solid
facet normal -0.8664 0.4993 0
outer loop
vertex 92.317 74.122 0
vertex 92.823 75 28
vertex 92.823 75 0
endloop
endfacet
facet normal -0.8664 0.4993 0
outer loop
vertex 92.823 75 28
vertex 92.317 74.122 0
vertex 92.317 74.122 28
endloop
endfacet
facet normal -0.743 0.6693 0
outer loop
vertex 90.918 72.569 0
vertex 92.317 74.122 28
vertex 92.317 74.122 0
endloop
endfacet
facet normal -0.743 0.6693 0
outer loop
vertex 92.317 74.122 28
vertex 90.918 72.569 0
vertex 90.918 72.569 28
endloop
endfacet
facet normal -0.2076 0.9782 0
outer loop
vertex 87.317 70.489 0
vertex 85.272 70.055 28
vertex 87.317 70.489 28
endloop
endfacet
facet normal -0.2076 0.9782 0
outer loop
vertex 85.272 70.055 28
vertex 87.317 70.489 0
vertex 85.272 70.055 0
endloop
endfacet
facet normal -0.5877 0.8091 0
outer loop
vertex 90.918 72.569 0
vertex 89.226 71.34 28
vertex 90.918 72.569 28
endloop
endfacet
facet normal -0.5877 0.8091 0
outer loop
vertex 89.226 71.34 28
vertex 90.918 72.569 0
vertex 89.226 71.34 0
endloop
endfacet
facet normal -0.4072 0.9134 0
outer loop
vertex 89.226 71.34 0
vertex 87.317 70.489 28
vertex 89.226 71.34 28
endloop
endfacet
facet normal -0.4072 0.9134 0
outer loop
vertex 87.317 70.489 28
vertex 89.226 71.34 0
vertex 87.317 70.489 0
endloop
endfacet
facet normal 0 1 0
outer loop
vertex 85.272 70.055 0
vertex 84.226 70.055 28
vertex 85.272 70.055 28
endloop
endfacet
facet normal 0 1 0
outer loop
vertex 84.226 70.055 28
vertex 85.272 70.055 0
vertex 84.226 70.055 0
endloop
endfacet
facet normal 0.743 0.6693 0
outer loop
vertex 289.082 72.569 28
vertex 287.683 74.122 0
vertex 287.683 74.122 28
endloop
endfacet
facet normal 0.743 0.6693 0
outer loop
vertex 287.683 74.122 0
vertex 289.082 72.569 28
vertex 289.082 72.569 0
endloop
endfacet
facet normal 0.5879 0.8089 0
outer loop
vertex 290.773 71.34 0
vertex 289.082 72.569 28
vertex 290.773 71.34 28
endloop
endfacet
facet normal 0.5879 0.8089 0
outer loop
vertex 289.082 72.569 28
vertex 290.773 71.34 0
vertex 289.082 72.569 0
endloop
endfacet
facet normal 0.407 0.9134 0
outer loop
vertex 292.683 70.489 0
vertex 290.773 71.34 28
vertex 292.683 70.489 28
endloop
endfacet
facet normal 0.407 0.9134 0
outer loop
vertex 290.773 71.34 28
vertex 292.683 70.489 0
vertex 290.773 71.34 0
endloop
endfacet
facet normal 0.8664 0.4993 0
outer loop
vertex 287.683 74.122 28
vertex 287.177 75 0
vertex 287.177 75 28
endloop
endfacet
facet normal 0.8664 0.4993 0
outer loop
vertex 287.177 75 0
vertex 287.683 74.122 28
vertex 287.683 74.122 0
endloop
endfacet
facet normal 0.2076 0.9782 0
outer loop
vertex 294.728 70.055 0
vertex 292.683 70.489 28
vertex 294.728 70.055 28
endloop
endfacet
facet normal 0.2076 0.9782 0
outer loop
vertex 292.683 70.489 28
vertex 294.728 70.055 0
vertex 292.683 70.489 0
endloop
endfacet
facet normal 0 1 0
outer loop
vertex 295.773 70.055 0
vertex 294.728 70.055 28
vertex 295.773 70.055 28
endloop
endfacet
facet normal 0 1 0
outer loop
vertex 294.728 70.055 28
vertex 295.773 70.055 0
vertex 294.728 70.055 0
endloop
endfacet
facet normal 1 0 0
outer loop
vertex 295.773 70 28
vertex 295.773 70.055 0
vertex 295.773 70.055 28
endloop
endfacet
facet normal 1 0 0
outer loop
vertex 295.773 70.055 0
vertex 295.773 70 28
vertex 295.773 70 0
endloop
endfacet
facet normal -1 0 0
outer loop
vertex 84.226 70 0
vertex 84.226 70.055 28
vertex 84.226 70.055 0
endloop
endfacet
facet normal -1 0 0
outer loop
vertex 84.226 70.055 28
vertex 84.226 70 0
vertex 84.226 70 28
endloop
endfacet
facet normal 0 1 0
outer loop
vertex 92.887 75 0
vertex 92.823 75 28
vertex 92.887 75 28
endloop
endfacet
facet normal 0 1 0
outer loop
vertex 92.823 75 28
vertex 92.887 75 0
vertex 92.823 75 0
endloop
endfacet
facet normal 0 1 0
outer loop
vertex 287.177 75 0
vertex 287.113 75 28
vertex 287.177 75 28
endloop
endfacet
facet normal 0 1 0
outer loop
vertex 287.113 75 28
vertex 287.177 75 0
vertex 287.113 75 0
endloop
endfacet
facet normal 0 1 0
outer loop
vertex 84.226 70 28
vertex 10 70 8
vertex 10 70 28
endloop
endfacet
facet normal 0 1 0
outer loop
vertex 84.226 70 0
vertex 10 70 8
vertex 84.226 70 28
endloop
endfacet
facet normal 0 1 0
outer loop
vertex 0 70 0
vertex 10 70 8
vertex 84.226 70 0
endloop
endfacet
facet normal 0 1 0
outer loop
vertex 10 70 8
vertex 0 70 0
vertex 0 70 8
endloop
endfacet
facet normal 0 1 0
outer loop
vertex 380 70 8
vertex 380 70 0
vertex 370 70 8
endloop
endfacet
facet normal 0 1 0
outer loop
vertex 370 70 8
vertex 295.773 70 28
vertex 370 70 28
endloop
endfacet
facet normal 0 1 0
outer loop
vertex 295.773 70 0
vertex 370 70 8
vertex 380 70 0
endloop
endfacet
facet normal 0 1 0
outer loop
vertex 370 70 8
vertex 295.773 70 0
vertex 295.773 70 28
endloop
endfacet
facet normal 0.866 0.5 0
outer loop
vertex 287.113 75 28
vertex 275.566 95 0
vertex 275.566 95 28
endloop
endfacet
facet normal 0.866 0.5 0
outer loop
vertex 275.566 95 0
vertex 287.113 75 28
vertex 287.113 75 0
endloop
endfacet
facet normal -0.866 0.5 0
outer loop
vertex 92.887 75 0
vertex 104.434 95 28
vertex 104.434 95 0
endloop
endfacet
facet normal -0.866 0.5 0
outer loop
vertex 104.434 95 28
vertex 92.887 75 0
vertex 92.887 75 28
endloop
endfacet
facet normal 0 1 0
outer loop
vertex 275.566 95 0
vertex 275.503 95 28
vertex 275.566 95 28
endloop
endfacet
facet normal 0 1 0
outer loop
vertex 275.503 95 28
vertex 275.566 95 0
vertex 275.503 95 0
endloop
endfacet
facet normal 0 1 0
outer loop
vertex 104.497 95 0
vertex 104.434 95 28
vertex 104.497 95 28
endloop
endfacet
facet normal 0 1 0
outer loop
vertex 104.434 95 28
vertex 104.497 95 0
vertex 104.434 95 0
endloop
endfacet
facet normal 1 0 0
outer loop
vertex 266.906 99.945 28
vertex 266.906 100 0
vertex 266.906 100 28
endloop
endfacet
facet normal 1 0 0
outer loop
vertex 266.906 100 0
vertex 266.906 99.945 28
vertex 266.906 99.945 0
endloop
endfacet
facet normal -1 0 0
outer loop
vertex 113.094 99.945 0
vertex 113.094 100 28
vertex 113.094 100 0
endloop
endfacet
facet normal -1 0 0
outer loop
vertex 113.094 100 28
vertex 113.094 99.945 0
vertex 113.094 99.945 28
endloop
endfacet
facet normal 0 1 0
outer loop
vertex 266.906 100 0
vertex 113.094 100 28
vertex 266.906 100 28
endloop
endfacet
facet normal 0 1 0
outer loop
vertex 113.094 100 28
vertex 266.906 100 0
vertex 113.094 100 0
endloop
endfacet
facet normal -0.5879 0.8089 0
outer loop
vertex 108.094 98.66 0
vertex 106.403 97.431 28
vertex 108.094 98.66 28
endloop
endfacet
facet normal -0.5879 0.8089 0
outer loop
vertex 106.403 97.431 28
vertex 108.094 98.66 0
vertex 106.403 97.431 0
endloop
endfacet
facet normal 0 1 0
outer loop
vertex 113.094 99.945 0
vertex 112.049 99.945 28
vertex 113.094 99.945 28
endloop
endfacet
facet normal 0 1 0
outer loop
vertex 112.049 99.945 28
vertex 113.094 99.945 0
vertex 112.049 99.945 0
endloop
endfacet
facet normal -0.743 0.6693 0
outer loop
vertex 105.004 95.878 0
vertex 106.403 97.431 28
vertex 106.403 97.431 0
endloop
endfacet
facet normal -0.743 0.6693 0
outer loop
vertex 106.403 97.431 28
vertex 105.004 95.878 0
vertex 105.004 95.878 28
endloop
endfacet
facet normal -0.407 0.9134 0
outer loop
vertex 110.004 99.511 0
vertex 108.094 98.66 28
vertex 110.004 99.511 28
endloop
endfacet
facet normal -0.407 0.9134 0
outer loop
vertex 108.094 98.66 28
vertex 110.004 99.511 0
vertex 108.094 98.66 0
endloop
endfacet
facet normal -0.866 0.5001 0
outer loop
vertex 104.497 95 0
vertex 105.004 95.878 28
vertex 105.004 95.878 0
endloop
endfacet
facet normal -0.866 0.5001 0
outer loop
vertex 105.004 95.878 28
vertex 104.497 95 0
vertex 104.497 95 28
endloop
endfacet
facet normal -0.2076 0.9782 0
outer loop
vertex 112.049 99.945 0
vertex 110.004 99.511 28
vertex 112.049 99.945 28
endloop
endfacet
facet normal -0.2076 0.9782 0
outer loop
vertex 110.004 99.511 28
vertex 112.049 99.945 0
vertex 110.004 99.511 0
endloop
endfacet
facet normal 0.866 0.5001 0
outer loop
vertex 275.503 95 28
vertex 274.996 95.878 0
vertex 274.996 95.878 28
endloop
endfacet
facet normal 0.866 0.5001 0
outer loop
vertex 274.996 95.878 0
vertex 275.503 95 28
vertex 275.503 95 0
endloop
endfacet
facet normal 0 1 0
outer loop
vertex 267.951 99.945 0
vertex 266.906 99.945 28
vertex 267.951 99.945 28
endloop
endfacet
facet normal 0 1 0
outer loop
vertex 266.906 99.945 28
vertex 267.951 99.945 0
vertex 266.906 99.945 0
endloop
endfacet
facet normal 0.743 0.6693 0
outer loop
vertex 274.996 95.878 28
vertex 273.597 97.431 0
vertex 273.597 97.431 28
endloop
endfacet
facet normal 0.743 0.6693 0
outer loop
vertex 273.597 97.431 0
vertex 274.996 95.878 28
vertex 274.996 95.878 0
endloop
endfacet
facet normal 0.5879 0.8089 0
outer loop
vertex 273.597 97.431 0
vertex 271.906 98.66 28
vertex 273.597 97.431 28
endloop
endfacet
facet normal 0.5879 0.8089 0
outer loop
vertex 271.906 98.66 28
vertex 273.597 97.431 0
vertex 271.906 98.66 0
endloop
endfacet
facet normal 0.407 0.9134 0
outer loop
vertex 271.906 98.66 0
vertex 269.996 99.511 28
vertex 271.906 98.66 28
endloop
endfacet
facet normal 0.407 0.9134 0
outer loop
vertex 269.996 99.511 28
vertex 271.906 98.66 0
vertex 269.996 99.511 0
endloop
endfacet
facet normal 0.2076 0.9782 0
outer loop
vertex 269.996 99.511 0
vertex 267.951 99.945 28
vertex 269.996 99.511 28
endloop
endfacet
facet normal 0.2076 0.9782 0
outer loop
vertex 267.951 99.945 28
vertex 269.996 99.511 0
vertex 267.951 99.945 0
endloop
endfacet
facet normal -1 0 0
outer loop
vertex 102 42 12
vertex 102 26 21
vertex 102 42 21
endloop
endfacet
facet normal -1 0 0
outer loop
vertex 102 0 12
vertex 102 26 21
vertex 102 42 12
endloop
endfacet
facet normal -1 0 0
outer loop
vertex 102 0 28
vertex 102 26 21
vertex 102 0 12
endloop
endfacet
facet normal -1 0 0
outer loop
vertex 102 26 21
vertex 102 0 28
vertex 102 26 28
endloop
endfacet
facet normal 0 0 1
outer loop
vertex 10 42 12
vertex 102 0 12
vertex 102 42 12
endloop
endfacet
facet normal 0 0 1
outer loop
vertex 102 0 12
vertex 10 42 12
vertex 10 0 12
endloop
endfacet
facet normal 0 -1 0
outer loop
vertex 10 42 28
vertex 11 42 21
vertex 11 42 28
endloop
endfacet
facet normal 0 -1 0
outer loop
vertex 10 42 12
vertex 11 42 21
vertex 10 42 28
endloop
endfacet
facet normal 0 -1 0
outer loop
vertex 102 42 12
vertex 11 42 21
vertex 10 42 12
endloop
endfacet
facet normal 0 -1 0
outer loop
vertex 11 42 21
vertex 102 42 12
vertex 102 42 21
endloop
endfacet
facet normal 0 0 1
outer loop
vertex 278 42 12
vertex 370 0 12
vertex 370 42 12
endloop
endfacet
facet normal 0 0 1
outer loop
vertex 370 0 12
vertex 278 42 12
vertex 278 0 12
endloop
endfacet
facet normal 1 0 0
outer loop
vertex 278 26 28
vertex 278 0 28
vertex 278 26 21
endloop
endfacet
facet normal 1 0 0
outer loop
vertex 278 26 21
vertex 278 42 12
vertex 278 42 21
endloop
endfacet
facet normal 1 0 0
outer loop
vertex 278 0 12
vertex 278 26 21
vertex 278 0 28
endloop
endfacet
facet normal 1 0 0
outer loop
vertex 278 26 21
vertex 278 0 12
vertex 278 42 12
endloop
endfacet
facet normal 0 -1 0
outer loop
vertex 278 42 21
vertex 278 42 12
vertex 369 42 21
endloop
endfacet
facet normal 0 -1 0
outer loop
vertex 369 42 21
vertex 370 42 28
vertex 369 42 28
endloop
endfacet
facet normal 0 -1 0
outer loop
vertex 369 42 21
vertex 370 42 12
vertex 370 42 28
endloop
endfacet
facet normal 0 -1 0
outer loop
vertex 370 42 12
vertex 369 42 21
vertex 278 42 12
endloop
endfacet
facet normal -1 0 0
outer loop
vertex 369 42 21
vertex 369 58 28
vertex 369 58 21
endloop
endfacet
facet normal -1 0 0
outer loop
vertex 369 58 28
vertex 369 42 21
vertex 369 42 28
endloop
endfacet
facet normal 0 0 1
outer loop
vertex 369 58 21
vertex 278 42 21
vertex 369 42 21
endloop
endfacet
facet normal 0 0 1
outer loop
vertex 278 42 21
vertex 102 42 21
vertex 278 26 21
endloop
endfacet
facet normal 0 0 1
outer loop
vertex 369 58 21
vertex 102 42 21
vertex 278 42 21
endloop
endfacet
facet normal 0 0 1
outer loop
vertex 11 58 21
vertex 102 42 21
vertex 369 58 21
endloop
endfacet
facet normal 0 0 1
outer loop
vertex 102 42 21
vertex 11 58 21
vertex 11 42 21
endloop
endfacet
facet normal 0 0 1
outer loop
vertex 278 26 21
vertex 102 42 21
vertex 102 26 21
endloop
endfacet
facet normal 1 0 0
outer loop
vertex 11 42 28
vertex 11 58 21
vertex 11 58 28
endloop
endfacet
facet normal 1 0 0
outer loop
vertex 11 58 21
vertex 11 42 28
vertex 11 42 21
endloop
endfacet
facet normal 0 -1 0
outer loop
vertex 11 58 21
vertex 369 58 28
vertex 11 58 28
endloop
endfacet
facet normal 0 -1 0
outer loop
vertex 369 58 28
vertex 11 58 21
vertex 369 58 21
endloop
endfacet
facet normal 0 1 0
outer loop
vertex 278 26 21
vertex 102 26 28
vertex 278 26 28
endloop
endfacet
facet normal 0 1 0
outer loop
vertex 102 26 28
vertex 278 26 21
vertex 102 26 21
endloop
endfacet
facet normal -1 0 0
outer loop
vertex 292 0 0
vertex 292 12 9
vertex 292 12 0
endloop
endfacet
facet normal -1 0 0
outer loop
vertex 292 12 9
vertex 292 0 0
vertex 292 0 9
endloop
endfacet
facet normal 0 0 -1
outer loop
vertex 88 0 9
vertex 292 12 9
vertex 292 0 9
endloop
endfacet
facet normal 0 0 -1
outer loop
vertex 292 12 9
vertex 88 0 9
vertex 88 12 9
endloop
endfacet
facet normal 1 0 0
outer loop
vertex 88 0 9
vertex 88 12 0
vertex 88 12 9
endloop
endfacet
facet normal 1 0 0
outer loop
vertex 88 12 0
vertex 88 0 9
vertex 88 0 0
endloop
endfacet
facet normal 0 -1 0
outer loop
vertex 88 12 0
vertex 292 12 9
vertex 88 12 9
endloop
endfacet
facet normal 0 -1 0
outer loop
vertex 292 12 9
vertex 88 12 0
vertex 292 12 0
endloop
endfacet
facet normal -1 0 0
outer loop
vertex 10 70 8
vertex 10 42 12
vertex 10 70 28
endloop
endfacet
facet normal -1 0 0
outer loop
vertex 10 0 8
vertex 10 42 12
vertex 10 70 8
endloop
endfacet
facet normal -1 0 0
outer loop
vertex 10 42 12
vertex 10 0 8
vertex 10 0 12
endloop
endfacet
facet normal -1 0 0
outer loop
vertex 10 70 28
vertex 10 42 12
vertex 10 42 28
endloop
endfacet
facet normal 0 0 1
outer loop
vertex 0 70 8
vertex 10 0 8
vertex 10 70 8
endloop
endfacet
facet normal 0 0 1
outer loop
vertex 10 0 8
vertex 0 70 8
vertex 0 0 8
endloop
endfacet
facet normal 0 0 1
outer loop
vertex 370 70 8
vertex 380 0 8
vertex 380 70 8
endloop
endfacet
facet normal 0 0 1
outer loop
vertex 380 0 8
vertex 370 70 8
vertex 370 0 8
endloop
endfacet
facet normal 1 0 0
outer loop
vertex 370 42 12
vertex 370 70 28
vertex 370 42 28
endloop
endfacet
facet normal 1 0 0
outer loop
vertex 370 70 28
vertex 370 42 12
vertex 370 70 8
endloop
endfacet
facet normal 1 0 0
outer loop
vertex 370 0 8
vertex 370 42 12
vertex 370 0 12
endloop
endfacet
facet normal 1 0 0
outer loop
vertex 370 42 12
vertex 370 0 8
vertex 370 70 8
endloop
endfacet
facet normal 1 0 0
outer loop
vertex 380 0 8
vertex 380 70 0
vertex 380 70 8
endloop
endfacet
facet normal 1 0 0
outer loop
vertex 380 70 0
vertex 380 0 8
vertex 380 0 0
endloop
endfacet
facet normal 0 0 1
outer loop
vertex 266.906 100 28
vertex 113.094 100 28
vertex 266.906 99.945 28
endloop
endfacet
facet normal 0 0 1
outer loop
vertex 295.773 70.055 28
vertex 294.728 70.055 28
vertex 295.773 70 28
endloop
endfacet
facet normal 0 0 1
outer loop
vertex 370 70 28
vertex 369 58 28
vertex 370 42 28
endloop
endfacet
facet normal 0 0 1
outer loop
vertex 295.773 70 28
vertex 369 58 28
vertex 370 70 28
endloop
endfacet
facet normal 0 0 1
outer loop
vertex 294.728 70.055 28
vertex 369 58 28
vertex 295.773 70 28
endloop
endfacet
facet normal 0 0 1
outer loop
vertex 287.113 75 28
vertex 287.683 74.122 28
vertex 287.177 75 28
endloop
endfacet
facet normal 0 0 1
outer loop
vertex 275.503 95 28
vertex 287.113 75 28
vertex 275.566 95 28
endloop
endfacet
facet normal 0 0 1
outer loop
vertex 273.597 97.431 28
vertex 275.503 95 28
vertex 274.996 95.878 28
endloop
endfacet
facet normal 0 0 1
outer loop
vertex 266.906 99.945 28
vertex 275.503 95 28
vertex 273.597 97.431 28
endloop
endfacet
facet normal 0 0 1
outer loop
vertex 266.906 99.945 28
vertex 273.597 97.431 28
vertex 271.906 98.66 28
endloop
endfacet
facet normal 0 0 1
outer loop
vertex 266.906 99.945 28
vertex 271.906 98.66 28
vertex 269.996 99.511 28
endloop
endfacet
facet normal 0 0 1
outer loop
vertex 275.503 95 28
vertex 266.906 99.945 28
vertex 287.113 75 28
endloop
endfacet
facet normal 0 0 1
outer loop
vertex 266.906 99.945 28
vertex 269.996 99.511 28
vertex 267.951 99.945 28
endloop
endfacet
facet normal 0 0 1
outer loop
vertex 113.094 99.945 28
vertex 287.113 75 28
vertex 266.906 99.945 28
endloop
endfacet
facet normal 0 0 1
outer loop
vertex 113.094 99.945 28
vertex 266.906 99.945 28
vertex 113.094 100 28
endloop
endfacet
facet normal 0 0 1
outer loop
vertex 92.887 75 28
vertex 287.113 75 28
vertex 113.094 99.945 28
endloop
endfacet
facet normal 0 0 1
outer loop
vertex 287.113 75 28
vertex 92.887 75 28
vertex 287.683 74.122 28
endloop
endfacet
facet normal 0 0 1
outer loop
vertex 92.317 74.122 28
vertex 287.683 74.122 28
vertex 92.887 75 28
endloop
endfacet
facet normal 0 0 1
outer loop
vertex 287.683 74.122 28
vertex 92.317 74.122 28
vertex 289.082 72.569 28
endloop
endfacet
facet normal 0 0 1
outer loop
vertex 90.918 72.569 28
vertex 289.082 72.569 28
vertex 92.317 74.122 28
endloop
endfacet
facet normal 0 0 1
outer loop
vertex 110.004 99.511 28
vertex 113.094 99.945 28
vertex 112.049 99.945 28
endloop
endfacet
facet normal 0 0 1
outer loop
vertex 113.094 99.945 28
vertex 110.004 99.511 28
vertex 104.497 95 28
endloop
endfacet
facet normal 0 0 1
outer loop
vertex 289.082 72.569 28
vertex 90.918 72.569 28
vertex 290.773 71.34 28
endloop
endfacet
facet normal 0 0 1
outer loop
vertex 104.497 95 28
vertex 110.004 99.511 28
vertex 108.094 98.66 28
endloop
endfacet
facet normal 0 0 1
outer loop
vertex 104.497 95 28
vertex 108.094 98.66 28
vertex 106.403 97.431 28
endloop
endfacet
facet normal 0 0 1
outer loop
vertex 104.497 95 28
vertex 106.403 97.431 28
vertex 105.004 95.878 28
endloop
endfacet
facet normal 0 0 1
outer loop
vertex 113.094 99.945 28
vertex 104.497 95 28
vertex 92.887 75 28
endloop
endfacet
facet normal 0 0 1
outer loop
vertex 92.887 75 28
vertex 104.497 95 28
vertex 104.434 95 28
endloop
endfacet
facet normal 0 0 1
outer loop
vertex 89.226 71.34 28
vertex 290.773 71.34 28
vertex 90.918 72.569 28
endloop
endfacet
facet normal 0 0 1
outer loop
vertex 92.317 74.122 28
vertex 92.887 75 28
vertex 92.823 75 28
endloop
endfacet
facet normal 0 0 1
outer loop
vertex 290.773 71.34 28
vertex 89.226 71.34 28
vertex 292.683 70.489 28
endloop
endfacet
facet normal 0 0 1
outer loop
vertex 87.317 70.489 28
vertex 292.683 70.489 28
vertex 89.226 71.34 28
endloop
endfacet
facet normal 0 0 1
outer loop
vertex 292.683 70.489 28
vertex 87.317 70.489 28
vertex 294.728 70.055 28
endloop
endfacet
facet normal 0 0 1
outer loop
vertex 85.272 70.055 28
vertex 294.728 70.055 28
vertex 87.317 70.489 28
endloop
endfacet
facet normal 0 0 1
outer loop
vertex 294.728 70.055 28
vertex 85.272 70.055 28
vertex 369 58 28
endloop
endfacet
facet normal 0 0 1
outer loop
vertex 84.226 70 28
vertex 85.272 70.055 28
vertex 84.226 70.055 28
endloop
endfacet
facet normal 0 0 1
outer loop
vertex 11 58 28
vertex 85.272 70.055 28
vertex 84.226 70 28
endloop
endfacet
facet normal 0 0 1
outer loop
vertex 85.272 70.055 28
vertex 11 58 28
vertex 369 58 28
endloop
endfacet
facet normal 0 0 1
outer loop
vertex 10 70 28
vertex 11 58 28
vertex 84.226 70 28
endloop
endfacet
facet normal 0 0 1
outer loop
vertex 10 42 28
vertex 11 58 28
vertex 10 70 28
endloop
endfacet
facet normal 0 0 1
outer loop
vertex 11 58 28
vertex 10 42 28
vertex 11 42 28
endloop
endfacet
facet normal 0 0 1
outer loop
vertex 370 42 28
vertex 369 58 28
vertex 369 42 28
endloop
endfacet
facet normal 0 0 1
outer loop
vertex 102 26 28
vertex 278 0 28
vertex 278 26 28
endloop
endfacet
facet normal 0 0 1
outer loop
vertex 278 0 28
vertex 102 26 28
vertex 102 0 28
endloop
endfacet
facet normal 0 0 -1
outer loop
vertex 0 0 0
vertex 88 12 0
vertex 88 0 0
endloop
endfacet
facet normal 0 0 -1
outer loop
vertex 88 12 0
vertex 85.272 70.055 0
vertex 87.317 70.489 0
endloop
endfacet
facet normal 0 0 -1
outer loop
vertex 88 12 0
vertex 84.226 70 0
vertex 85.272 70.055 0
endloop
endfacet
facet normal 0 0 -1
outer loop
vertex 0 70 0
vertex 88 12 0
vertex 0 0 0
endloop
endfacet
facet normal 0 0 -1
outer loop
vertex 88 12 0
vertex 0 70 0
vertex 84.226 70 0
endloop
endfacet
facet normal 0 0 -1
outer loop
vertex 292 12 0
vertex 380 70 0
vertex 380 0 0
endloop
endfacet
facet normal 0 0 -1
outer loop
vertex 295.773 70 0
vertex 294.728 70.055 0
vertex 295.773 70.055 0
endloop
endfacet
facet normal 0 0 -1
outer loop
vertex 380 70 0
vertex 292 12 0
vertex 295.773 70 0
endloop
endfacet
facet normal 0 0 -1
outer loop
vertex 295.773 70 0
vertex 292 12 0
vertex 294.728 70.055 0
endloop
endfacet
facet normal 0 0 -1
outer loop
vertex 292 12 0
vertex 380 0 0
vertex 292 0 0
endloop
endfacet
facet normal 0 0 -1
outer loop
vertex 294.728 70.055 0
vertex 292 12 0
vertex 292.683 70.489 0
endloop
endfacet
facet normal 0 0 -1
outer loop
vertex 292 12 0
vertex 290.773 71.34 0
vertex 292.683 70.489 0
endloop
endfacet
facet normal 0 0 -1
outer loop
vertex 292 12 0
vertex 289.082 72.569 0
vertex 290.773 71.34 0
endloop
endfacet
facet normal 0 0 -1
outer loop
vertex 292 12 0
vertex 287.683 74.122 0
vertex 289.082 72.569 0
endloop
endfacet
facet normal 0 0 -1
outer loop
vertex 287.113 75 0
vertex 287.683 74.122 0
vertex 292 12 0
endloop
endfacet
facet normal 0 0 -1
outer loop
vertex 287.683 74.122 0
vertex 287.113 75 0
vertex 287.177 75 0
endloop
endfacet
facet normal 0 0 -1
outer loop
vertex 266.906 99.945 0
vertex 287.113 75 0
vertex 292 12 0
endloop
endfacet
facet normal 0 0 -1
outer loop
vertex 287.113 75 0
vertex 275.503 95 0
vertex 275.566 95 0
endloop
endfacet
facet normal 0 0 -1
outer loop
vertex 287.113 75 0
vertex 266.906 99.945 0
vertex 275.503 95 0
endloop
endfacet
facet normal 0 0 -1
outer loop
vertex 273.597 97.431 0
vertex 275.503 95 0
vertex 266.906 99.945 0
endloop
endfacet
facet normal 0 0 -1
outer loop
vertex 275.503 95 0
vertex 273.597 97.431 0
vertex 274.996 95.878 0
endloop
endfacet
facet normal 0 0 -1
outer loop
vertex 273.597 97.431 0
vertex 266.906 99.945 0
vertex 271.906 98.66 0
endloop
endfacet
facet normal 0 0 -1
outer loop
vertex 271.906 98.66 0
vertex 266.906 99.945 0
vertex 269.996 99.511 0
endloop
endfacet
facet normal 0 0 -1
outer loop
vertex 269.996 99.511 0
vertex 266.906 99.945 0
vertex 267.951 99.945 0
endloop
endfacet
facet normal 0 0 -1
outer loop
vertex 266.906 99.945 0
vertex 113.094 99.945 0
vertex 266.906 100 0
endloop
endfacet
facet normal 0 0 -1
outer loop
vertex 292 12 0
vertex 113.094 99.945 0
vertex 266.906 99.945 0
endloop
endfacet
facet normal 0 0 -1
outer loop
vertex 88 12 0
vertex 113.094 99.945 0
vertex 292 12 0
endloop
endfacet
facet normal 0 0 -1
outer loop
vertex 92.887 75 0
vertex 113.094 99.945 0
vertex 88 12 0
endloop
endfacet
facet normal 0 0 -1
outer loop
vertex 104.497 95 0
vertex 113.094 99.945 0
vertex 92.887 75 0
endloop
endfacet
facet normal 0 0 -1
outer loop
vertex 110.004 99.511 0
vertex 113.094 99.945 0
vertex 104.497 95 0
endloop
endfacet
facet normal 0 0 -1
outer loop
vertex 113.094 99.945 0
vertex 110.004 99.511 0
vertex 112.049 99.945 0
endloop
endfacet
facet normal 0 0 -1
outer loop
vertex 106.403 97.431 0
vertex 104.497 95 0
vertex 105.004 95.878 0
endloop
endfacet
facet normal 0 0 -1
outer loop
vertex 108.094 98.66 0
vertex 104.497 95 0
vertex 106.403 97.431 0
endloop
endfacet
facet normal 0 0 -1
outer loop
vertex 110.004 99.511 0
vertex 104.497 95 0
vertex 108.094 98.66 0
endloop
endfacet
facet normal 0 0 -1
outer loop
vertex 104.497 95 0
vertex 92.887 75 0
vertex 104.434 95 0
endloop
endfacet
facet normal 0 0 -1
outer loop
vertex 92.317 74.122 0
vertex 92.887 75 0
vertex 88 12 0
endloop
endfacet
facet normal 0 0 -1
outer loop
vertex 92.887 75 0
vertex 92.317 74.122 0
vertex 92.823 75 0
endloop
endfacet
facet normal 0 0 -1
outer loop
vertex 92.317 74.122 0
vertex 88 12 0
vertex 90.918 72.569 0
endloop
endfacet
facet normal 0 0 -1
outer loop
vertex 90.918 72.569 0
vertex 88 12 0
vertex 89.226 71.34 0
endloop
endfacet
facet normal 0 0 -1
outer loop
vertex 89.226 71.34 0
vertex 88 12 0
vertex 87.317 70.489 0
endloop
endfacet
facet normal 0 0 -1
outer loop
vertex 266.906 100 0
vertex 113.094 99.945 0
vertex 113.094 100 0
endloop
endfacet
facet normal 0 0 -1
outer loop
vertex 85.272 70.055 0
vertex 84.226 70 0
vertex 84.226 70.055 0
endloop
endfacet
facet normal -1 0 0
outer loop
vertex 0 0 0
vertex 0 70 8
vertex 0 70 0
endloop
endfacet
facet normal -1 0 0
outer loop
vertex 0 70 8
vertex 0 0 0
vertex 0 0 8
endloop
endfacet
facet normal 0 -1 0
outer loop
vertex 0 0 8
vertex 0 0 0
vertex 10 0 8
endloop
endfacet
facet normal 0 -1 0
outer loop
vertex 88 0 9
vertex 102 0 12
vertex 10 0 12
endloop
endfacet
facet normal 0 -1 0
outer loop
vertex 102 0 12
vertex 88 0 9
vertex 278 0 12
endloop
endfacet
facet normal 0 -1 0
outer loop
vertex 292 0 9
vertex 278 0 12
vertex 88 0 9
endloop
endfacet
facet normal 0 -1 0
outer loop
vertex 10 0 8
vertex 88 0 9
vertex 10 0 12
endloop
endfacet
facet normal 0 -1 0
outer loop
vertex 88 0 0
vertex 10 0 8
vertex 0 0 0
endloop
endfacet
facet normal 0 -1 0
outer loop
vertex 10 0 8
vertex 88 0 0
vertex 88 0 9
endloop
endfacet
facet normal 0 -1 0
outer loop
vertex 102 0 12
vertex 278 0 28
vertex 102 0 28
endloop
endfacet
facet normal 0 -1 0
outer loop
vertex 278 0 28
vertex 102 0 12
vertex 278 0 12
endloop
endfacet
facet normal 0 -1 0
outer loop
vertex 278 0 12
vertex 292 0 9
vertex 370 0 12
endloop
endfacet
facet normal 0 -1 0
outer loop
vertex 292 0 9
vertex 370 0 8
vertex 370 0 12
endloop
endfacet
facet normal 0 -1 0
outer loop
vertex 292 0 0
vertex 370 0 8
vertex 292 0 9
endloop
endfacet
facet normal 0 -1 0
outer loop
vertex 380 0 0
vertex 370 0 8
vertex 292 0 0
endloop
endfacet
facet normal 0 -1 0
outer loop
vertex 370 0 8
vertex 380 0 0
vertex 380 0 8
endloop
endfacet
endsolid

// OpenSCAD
include <../src/wardrobe.scad>;
plank_yz_side_top();
//github_openscad -o wardrobe_3/plank_yz_side_top.stl -D wardrobe_n=3 -D cutting_edge=0 -D break_view_length=0 wardrobe_3/plank_yz_side_top_stl.scad
